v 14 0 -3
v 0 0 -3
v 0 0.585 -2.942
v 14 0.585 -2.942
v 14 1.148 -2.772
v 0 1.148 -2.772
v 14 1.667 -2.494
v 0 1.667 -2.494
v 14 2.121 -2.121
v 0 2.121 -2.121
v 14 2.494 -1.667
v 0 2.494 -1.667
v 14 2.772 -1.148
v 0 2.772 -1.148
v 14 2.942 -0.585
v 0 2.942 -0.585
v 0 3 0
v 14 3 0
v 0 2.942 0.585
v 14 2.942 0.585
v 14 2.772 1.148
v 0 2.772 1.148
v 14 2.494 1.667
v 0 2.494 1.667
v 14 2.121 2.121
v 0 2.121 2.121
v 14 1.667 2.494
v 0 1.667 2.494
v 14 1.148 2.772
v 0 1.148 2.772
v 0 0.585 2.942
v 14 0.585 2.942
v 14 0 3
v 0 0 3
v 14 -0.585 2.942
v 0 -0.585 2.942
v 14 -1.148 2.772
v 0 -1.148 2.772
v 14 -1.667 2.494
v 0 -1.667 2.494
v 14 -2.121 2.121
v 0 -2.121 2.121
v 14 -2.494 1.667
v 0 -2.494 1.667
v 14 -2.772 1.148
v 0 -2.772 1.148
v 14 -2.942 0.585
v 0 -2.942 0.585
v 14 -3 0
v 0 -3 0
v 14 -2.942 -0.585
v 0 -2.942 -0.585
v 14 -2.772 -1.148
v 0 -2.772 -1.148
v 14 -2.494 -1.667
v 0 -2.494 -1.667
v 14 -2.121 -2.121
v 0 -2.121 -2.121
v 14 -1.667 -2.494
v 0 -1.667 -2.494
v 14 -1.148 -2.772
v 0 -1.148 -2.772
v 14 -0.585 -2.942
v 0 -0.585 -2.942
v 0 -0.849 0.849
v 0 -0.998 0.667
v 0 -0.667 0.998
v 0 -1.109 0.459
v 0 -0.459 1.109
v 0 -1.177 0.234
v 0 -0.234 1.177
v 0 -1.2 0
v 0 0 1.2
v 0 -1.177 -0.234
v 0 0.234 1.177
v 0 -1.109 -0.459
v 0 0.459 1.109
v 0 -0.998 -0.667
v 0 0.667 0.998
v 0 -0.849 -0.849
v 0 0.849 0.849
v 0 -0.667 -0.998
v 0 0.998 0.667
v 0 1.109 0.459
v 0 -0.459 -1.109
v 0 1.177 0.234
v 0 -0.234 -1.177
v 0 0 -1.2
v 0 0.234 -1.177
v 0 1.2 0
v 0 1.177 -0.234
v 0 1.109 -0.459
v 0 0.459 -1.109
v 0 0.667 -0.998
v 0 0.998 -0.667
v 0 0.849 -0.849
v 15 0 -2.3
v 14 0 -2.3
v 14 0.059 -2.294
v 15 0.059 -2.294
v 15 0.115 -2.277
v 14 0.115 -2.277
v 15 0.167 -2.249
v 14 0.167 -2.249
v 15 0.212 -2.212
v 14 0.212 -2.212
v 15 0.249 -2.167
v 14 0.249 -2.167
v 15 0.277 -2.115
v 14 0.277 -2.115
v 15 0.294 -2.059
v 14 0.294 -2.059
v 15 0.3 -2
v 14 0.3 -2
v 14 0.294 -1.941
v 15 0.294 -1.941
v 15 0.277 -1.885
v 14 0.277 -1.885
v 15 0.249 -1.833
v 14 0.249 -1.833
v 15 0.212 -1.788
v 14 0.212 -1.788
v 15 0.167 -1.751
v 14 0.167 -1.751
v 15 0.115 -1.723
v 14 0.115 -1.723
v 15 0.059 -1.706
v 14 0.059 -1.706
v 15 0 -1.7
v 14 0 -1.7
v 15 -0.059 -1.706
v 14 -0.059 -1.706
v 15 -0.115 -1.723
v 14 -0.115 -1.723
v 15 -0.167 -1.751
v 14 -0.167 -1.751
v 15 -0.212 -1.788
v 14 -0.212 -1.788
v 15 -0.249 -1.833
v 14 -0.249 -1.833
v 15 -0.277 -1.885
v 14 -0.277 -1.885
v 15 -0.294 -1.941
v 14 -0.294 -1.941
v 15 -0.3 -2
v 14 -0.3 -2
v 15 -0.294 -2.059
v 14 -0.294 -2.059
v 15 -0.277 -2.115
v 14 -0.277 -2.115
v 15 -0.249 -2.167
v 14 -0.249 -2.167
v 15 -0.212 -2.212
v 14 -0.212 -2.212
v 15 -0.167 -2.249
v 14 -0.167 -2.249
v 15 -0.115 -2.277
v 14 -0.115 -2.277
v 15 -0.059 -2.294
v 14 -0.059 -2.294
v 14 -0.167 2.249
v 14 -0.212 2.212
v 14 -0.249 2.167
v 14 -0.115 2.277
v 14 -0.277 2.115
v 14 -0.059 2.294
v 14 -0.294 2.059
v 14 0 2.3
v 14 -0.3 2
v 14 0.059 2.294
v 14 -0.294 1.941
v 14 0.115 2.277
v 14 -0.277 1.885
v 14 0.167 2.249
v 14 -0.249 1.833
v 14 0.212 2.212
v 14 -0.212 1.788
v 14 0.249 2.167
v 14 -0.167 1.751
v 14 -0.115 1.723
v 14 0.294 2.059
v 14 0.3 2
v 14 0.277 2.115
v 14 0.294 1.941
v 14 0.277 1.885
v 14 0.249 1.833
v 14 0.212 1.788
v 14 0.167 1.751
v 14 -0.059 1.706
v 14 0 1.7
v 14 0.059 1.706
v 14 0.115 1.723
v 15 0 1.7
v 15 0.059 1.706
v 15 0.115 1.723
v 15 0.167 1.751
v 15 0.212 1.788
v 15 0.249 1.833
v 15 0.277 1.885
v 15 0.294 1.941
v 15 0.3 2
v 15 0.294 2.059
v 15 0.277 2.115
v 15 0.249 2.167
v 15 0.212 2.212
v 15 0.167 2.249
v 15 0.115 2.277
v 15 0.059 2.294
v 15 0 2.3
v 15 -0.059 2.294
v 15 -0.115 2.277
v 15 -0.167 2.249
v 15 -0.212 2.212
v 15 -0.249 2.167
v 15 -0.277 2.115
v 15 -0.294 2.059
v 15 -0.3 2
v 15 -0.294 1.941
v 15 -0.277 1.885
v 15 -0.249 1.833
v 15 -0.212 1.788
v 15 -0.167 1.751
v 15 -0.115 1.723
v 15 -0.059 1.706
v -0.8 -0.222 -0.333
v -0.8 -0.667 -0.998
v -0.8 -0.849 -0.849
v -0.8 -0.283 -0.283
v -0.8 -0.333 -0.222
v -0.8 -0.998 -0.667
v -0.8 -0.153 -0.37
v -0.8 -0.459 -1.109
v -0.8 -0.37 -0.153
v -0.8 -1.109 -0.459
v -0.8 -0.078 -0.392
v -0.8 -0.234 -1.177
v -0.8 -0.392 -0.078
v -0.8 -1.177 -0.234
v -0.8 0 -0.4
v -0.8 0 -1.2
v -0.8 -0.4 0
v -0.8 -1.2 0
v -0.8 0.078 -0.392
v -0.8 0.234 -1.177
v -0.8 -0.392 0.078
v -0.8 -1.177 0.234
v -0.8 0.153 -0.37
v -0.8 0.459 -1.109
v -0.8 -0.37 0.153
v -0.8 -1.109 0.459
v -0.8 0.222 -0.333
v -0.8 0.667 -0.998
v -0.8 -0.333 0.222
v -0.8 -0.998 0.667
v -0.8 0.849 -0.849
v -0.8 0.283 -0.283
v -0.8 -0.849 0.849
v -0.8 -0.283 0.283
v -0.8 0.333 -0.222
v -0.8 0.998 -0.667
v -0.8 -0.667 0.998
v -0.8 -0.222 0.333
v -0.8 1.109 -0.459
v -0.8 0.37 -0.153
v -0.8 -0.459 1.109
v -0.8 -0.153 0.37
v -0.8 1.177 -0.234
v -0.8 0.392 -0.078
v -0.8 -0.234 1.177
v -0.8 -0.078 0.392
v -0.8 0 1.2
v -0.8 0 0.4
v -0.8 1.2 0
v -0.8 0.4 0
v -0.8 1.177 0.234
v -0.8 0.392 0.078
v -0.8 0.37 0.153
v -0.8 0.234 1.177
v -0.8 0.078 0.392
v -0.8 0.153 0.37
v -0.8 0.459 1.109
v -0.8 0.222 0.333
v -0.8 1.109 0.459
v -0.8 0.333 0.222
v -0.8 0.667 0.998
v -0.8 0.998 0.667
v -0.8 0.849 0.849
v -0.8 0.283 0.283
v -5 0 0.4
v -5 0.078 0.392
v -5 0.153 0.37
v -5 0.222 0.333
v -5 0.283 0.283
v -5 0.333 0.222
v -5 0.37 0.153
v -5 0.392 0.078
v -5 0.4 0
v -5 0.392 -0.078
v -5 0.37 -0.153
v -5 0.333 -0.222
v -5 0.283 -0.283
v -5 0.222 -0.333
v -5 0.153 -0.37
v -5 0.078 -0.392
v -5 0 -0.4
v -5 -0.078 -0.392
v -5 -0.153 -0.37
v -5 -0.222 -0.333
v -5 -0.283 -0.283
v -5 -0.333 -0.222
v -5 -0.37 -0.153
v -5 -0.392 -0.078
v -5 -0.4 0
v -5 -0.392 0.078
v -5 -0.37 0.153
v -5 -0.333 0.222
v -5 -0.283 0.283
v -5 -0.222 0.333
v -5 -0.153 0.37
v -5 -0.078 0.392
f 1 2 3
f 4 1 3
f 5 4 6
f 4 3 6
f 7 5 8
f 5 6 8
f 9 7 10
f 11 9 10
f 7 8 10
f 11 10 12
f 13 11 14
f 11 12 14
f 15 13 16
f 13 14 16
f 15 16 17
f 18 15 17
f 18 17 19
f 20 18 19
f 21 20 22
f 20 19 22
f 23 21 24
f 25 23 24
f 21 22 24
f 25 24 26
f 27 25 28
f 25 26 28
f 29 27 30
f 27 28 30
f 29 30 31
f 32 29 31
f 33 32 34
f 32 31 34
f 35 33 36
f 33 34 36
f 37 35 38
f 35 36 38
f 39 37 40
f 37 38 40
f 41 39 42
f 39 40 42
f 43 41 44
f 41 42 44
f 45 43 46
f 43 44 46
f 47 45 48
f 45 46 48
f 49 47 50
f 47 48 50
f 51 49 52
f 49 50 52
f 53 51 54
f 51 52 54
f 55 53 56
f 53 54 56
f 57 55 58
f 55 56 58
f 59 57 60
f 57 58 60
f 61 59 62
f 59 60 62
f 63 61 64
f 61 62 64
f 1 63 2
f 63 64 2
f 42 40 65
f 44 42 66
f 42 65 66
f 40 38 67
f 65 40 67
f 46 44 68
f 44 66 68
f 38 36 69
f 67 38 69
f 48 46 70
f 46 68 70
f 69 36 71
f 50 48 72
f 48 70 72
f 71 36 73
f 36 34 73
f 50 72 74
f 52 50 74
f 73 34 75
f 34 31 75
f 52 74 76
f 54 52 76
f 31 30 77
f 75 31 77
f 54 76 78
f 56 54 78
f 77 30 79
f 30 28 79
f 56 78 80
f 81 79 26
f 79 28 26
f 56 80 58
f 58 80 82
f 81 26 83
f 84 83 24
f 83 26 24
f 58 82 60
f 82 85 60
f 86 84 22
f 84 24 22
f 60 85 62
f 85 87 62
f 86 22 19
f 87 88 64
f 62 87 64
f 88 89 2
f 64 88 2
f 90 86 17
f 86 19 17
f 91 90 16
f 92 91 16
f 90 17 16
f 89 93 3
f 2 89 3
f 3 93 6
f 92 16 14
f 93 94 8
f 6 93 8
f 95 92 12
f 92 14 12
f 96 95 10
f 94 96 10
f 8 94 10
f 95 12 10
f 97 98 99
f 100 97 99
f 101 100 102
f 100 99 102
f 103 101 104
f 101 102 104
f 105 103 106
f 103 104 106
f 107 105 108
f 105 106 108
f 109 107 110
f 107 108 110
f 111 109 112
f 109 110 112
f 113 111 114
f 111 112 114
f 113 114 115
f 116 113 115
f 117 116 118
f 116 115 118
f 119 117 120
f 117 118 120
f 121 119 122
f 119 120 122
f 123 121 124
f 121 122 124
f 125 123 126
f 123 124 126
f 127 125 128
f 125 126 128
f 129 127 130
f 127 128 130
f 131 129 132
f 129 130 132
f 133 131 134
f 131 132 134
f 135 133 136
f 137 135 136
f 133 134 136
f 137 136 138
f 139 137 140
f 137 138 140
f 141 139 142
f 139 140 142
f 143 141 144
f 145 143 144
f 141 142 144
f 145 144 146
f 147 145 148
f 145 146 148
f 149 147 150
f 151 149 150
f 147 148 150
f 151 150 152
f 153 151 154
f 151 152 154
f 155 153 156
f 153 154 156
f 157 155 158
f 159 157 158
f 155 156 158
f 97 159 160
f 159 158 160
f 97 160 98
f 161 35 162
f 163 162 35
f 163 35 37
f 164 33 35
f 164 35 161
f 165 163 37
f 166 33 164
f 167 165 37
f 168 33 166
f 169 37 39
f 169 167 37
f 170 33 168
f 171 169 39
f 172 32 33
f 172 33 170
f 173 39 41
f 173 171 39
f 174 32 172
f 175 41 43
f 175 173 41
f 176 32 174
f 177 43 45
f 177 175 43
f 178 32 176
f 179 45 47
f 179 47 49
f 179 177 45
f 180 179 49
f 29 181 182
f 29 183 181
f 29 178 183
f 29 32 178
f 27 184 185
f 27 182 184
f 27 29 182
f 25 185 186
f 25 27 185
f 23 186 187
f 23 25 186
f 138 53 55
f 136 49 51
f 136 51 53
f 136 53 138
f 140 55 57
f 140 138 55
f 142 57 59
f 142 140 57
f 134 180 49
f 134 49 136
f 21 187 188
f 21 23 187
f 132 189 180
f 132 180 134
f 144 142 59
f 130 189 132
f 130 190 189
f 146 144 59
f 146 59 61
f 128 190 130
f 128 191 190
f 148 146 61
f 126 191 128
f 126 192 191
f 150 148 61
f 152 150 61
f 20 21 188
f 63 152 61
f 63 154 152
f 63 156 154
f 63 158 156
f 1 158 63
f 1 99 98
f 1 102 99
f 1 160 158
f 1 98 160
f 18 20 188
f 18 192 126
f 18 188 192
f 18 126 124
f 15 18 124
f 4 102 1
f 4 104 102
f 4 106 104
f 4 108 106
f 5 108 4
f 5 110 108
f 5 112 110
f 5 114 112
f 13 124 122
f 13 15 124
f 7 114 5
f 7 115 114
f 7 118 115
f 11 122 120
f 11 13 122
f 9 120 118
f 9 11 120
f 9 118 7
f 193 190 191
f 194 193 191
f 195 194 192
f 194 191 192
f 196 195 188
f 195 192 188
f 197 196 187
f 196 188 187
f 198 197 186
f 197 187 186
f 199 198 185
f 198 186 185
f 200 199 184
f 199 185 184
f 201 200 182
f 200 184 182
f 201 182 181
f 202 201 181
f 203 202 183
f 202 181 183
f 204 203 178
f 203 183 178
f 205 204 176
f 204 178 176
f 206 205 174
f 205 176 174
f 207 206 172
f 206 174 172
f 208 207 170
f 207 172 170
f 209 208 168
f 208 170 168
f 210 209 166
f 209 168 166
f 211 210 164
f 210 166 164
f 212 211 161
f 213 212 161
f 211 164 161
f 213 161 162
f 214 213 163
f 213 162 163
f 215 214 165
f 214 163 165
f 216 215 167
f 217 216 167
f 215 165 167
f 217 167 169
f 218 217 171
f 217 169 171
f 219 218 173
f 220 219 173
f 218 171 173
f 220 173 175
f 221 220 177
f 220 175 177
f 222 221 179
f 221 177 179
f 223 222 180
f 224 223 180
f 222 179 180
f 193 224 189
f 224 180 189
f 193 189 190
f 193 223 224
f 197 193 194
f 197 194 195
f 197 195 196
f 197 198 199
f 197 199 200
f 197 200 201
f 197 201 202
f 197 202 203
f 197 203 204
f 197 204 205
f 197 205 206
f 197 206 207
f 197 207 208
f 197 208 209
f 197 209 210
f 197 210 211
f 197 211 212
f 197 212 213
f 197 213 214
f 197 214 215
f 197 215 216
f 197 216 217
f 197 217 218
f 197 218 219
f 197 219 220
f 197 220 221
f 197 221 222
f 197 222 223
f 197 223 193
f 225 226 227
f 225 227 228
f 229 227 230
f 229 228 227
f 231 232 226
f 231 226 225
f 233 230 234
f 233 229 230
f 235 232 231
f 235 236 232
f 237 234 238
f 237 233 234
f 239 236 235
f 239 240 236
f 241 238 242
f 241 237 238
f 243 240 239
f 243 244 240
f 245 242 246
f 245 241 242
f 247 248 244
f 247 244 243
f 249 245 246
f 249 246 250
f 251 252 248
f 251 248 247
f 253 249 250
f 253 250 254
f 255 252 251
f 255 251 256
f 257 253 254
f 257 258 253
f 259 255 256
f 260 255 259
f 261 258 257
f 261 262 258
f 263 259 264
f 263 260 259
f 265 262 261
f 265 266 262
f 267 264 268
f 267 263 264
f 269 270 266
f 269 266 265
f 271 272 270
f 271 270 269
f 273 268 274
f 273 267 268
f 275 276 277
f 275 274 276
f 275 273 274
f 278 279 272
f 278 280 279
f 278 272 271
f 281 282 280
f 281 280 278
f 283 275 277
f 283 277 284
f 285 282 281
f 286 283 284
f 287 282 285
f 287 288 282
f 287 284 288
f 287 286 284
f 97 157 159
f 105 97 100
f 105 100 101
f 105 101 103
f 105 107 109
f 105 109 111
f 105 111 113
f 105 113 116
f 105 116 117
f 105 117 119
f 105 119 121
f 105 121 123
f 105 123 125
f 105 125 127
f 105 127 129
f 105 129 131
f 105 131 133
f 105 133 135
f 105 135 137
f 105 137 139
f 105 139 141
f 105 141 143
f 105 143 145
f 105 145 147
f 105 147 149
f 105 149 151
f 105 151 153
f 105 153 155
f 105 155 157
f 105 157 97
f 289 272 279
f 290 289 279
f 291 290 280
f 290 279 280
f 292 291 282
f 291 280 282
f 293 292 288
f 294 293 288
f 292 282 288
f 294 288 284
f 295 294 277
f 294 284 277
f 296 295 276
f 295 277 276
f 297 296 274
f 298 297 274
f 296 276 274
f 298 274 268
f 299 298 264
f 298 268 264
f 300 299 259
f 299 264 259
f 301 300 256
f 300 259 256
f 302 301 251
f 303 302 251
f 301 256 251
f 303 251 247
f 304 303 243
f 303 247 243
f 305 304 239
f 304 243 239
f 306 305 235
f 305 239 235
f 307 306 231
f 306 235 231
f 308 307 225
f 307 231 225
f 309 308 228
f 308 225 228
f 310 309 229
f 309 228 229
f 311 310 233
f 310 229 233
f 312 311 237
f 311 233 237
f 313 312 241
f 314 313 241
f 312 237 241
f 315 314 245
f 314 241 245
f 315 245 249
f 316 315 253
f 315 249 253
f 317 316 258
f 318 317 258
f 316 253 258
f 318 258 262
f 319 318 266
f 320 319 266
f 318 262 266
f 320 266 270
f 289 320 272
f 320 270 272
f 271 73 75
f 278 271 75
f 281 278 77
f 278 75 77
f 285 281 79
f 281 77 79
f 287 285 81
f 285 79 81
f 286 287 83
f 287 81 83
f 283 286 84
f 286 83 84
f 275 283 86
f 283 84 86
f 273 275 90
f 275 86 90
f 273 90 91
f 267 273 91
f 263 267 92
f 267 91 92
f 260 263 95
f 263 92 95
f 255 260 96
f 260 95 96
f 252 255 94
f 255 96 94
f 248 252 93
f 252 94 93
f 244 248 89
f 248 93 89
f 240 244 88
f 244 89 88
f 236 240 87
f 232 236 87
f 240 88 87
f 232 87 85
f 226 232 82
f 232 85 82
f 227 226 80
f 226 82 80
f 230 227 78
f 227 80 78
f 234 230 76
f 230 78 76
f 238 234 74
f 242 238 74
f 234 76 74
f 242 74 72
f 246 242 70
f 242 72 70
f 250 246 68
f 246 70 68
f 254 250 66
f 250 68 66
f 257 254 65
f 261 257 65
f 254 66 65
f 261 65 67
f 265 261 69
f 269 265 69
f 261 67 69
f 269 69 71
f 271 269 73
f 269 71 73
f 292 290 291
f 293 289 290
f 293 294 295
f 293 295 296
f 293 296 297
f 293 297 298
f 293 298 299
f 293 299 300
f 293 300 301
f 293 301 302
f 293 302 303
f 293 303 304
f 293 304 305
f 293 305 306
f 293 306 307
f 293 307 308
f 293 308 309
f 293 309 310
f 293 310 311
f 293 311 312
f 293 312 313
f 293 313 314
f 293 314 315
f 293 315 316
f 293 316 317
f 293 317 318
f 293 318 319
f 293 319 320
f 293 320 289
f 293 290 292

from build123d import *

# Parameters (mm, degrees)
SKETCH1_R           = 3
BOSS_EXTRUDE1_DEPTH = 14
SKETCH2_R           = 1.2
BOSS_EXTRUDE2_DEPTH = 0.8
SKETCH3_R           = 0.4
BOSS_EXTRUDE3_DEPTH = 4.2
SKETCH4_R           = 0.3
BOSS_EXTRUDE4_DEPTH = 1


with BuildPart() as part:
    # Sketch1 → Boss-Extrude1 (new body)
    with BuildSketch(Plane(origin=(0, 0, 0), x_dir=(0, 0, -1), z_dir=(1, 0, 0))):
        Circle(SKETCH1_R)
    extrude(amount=BOSS_EXTRUDE1_DEPTH)

    # Sketch2 → Boss-Extrude2 (add)
    with BuildSketch(Plane.ZY):
        Circle(SKETCH2_R)
    extrude(amount=BOSS_EXTRUDE2_DEPTH)

    # Sketch3 → Boss-Extrude3 (add)
    with BuildSketch(Plane.ZY.offset(0.8)):
        Circle(SKETCH3_R)
    extrude(amount=BOSS_EXTRUDE3_DEPTH)

    # Sketch4 → Boss-Extrude4 (add)
    with BuildSketch(Plane(origin=(14, 0, 0), x_dir=(0, 0, -1), z_dir=(1, 0, 0))):
        with Locations((-2, 0)):
            Circle(SKETCH4_R)
        with Locations((2, 0)):
            Circle(SKETCH4_R)
    extrude(amount=BOSS_EXTRUDE4_DEPTH)


solid = part.part
